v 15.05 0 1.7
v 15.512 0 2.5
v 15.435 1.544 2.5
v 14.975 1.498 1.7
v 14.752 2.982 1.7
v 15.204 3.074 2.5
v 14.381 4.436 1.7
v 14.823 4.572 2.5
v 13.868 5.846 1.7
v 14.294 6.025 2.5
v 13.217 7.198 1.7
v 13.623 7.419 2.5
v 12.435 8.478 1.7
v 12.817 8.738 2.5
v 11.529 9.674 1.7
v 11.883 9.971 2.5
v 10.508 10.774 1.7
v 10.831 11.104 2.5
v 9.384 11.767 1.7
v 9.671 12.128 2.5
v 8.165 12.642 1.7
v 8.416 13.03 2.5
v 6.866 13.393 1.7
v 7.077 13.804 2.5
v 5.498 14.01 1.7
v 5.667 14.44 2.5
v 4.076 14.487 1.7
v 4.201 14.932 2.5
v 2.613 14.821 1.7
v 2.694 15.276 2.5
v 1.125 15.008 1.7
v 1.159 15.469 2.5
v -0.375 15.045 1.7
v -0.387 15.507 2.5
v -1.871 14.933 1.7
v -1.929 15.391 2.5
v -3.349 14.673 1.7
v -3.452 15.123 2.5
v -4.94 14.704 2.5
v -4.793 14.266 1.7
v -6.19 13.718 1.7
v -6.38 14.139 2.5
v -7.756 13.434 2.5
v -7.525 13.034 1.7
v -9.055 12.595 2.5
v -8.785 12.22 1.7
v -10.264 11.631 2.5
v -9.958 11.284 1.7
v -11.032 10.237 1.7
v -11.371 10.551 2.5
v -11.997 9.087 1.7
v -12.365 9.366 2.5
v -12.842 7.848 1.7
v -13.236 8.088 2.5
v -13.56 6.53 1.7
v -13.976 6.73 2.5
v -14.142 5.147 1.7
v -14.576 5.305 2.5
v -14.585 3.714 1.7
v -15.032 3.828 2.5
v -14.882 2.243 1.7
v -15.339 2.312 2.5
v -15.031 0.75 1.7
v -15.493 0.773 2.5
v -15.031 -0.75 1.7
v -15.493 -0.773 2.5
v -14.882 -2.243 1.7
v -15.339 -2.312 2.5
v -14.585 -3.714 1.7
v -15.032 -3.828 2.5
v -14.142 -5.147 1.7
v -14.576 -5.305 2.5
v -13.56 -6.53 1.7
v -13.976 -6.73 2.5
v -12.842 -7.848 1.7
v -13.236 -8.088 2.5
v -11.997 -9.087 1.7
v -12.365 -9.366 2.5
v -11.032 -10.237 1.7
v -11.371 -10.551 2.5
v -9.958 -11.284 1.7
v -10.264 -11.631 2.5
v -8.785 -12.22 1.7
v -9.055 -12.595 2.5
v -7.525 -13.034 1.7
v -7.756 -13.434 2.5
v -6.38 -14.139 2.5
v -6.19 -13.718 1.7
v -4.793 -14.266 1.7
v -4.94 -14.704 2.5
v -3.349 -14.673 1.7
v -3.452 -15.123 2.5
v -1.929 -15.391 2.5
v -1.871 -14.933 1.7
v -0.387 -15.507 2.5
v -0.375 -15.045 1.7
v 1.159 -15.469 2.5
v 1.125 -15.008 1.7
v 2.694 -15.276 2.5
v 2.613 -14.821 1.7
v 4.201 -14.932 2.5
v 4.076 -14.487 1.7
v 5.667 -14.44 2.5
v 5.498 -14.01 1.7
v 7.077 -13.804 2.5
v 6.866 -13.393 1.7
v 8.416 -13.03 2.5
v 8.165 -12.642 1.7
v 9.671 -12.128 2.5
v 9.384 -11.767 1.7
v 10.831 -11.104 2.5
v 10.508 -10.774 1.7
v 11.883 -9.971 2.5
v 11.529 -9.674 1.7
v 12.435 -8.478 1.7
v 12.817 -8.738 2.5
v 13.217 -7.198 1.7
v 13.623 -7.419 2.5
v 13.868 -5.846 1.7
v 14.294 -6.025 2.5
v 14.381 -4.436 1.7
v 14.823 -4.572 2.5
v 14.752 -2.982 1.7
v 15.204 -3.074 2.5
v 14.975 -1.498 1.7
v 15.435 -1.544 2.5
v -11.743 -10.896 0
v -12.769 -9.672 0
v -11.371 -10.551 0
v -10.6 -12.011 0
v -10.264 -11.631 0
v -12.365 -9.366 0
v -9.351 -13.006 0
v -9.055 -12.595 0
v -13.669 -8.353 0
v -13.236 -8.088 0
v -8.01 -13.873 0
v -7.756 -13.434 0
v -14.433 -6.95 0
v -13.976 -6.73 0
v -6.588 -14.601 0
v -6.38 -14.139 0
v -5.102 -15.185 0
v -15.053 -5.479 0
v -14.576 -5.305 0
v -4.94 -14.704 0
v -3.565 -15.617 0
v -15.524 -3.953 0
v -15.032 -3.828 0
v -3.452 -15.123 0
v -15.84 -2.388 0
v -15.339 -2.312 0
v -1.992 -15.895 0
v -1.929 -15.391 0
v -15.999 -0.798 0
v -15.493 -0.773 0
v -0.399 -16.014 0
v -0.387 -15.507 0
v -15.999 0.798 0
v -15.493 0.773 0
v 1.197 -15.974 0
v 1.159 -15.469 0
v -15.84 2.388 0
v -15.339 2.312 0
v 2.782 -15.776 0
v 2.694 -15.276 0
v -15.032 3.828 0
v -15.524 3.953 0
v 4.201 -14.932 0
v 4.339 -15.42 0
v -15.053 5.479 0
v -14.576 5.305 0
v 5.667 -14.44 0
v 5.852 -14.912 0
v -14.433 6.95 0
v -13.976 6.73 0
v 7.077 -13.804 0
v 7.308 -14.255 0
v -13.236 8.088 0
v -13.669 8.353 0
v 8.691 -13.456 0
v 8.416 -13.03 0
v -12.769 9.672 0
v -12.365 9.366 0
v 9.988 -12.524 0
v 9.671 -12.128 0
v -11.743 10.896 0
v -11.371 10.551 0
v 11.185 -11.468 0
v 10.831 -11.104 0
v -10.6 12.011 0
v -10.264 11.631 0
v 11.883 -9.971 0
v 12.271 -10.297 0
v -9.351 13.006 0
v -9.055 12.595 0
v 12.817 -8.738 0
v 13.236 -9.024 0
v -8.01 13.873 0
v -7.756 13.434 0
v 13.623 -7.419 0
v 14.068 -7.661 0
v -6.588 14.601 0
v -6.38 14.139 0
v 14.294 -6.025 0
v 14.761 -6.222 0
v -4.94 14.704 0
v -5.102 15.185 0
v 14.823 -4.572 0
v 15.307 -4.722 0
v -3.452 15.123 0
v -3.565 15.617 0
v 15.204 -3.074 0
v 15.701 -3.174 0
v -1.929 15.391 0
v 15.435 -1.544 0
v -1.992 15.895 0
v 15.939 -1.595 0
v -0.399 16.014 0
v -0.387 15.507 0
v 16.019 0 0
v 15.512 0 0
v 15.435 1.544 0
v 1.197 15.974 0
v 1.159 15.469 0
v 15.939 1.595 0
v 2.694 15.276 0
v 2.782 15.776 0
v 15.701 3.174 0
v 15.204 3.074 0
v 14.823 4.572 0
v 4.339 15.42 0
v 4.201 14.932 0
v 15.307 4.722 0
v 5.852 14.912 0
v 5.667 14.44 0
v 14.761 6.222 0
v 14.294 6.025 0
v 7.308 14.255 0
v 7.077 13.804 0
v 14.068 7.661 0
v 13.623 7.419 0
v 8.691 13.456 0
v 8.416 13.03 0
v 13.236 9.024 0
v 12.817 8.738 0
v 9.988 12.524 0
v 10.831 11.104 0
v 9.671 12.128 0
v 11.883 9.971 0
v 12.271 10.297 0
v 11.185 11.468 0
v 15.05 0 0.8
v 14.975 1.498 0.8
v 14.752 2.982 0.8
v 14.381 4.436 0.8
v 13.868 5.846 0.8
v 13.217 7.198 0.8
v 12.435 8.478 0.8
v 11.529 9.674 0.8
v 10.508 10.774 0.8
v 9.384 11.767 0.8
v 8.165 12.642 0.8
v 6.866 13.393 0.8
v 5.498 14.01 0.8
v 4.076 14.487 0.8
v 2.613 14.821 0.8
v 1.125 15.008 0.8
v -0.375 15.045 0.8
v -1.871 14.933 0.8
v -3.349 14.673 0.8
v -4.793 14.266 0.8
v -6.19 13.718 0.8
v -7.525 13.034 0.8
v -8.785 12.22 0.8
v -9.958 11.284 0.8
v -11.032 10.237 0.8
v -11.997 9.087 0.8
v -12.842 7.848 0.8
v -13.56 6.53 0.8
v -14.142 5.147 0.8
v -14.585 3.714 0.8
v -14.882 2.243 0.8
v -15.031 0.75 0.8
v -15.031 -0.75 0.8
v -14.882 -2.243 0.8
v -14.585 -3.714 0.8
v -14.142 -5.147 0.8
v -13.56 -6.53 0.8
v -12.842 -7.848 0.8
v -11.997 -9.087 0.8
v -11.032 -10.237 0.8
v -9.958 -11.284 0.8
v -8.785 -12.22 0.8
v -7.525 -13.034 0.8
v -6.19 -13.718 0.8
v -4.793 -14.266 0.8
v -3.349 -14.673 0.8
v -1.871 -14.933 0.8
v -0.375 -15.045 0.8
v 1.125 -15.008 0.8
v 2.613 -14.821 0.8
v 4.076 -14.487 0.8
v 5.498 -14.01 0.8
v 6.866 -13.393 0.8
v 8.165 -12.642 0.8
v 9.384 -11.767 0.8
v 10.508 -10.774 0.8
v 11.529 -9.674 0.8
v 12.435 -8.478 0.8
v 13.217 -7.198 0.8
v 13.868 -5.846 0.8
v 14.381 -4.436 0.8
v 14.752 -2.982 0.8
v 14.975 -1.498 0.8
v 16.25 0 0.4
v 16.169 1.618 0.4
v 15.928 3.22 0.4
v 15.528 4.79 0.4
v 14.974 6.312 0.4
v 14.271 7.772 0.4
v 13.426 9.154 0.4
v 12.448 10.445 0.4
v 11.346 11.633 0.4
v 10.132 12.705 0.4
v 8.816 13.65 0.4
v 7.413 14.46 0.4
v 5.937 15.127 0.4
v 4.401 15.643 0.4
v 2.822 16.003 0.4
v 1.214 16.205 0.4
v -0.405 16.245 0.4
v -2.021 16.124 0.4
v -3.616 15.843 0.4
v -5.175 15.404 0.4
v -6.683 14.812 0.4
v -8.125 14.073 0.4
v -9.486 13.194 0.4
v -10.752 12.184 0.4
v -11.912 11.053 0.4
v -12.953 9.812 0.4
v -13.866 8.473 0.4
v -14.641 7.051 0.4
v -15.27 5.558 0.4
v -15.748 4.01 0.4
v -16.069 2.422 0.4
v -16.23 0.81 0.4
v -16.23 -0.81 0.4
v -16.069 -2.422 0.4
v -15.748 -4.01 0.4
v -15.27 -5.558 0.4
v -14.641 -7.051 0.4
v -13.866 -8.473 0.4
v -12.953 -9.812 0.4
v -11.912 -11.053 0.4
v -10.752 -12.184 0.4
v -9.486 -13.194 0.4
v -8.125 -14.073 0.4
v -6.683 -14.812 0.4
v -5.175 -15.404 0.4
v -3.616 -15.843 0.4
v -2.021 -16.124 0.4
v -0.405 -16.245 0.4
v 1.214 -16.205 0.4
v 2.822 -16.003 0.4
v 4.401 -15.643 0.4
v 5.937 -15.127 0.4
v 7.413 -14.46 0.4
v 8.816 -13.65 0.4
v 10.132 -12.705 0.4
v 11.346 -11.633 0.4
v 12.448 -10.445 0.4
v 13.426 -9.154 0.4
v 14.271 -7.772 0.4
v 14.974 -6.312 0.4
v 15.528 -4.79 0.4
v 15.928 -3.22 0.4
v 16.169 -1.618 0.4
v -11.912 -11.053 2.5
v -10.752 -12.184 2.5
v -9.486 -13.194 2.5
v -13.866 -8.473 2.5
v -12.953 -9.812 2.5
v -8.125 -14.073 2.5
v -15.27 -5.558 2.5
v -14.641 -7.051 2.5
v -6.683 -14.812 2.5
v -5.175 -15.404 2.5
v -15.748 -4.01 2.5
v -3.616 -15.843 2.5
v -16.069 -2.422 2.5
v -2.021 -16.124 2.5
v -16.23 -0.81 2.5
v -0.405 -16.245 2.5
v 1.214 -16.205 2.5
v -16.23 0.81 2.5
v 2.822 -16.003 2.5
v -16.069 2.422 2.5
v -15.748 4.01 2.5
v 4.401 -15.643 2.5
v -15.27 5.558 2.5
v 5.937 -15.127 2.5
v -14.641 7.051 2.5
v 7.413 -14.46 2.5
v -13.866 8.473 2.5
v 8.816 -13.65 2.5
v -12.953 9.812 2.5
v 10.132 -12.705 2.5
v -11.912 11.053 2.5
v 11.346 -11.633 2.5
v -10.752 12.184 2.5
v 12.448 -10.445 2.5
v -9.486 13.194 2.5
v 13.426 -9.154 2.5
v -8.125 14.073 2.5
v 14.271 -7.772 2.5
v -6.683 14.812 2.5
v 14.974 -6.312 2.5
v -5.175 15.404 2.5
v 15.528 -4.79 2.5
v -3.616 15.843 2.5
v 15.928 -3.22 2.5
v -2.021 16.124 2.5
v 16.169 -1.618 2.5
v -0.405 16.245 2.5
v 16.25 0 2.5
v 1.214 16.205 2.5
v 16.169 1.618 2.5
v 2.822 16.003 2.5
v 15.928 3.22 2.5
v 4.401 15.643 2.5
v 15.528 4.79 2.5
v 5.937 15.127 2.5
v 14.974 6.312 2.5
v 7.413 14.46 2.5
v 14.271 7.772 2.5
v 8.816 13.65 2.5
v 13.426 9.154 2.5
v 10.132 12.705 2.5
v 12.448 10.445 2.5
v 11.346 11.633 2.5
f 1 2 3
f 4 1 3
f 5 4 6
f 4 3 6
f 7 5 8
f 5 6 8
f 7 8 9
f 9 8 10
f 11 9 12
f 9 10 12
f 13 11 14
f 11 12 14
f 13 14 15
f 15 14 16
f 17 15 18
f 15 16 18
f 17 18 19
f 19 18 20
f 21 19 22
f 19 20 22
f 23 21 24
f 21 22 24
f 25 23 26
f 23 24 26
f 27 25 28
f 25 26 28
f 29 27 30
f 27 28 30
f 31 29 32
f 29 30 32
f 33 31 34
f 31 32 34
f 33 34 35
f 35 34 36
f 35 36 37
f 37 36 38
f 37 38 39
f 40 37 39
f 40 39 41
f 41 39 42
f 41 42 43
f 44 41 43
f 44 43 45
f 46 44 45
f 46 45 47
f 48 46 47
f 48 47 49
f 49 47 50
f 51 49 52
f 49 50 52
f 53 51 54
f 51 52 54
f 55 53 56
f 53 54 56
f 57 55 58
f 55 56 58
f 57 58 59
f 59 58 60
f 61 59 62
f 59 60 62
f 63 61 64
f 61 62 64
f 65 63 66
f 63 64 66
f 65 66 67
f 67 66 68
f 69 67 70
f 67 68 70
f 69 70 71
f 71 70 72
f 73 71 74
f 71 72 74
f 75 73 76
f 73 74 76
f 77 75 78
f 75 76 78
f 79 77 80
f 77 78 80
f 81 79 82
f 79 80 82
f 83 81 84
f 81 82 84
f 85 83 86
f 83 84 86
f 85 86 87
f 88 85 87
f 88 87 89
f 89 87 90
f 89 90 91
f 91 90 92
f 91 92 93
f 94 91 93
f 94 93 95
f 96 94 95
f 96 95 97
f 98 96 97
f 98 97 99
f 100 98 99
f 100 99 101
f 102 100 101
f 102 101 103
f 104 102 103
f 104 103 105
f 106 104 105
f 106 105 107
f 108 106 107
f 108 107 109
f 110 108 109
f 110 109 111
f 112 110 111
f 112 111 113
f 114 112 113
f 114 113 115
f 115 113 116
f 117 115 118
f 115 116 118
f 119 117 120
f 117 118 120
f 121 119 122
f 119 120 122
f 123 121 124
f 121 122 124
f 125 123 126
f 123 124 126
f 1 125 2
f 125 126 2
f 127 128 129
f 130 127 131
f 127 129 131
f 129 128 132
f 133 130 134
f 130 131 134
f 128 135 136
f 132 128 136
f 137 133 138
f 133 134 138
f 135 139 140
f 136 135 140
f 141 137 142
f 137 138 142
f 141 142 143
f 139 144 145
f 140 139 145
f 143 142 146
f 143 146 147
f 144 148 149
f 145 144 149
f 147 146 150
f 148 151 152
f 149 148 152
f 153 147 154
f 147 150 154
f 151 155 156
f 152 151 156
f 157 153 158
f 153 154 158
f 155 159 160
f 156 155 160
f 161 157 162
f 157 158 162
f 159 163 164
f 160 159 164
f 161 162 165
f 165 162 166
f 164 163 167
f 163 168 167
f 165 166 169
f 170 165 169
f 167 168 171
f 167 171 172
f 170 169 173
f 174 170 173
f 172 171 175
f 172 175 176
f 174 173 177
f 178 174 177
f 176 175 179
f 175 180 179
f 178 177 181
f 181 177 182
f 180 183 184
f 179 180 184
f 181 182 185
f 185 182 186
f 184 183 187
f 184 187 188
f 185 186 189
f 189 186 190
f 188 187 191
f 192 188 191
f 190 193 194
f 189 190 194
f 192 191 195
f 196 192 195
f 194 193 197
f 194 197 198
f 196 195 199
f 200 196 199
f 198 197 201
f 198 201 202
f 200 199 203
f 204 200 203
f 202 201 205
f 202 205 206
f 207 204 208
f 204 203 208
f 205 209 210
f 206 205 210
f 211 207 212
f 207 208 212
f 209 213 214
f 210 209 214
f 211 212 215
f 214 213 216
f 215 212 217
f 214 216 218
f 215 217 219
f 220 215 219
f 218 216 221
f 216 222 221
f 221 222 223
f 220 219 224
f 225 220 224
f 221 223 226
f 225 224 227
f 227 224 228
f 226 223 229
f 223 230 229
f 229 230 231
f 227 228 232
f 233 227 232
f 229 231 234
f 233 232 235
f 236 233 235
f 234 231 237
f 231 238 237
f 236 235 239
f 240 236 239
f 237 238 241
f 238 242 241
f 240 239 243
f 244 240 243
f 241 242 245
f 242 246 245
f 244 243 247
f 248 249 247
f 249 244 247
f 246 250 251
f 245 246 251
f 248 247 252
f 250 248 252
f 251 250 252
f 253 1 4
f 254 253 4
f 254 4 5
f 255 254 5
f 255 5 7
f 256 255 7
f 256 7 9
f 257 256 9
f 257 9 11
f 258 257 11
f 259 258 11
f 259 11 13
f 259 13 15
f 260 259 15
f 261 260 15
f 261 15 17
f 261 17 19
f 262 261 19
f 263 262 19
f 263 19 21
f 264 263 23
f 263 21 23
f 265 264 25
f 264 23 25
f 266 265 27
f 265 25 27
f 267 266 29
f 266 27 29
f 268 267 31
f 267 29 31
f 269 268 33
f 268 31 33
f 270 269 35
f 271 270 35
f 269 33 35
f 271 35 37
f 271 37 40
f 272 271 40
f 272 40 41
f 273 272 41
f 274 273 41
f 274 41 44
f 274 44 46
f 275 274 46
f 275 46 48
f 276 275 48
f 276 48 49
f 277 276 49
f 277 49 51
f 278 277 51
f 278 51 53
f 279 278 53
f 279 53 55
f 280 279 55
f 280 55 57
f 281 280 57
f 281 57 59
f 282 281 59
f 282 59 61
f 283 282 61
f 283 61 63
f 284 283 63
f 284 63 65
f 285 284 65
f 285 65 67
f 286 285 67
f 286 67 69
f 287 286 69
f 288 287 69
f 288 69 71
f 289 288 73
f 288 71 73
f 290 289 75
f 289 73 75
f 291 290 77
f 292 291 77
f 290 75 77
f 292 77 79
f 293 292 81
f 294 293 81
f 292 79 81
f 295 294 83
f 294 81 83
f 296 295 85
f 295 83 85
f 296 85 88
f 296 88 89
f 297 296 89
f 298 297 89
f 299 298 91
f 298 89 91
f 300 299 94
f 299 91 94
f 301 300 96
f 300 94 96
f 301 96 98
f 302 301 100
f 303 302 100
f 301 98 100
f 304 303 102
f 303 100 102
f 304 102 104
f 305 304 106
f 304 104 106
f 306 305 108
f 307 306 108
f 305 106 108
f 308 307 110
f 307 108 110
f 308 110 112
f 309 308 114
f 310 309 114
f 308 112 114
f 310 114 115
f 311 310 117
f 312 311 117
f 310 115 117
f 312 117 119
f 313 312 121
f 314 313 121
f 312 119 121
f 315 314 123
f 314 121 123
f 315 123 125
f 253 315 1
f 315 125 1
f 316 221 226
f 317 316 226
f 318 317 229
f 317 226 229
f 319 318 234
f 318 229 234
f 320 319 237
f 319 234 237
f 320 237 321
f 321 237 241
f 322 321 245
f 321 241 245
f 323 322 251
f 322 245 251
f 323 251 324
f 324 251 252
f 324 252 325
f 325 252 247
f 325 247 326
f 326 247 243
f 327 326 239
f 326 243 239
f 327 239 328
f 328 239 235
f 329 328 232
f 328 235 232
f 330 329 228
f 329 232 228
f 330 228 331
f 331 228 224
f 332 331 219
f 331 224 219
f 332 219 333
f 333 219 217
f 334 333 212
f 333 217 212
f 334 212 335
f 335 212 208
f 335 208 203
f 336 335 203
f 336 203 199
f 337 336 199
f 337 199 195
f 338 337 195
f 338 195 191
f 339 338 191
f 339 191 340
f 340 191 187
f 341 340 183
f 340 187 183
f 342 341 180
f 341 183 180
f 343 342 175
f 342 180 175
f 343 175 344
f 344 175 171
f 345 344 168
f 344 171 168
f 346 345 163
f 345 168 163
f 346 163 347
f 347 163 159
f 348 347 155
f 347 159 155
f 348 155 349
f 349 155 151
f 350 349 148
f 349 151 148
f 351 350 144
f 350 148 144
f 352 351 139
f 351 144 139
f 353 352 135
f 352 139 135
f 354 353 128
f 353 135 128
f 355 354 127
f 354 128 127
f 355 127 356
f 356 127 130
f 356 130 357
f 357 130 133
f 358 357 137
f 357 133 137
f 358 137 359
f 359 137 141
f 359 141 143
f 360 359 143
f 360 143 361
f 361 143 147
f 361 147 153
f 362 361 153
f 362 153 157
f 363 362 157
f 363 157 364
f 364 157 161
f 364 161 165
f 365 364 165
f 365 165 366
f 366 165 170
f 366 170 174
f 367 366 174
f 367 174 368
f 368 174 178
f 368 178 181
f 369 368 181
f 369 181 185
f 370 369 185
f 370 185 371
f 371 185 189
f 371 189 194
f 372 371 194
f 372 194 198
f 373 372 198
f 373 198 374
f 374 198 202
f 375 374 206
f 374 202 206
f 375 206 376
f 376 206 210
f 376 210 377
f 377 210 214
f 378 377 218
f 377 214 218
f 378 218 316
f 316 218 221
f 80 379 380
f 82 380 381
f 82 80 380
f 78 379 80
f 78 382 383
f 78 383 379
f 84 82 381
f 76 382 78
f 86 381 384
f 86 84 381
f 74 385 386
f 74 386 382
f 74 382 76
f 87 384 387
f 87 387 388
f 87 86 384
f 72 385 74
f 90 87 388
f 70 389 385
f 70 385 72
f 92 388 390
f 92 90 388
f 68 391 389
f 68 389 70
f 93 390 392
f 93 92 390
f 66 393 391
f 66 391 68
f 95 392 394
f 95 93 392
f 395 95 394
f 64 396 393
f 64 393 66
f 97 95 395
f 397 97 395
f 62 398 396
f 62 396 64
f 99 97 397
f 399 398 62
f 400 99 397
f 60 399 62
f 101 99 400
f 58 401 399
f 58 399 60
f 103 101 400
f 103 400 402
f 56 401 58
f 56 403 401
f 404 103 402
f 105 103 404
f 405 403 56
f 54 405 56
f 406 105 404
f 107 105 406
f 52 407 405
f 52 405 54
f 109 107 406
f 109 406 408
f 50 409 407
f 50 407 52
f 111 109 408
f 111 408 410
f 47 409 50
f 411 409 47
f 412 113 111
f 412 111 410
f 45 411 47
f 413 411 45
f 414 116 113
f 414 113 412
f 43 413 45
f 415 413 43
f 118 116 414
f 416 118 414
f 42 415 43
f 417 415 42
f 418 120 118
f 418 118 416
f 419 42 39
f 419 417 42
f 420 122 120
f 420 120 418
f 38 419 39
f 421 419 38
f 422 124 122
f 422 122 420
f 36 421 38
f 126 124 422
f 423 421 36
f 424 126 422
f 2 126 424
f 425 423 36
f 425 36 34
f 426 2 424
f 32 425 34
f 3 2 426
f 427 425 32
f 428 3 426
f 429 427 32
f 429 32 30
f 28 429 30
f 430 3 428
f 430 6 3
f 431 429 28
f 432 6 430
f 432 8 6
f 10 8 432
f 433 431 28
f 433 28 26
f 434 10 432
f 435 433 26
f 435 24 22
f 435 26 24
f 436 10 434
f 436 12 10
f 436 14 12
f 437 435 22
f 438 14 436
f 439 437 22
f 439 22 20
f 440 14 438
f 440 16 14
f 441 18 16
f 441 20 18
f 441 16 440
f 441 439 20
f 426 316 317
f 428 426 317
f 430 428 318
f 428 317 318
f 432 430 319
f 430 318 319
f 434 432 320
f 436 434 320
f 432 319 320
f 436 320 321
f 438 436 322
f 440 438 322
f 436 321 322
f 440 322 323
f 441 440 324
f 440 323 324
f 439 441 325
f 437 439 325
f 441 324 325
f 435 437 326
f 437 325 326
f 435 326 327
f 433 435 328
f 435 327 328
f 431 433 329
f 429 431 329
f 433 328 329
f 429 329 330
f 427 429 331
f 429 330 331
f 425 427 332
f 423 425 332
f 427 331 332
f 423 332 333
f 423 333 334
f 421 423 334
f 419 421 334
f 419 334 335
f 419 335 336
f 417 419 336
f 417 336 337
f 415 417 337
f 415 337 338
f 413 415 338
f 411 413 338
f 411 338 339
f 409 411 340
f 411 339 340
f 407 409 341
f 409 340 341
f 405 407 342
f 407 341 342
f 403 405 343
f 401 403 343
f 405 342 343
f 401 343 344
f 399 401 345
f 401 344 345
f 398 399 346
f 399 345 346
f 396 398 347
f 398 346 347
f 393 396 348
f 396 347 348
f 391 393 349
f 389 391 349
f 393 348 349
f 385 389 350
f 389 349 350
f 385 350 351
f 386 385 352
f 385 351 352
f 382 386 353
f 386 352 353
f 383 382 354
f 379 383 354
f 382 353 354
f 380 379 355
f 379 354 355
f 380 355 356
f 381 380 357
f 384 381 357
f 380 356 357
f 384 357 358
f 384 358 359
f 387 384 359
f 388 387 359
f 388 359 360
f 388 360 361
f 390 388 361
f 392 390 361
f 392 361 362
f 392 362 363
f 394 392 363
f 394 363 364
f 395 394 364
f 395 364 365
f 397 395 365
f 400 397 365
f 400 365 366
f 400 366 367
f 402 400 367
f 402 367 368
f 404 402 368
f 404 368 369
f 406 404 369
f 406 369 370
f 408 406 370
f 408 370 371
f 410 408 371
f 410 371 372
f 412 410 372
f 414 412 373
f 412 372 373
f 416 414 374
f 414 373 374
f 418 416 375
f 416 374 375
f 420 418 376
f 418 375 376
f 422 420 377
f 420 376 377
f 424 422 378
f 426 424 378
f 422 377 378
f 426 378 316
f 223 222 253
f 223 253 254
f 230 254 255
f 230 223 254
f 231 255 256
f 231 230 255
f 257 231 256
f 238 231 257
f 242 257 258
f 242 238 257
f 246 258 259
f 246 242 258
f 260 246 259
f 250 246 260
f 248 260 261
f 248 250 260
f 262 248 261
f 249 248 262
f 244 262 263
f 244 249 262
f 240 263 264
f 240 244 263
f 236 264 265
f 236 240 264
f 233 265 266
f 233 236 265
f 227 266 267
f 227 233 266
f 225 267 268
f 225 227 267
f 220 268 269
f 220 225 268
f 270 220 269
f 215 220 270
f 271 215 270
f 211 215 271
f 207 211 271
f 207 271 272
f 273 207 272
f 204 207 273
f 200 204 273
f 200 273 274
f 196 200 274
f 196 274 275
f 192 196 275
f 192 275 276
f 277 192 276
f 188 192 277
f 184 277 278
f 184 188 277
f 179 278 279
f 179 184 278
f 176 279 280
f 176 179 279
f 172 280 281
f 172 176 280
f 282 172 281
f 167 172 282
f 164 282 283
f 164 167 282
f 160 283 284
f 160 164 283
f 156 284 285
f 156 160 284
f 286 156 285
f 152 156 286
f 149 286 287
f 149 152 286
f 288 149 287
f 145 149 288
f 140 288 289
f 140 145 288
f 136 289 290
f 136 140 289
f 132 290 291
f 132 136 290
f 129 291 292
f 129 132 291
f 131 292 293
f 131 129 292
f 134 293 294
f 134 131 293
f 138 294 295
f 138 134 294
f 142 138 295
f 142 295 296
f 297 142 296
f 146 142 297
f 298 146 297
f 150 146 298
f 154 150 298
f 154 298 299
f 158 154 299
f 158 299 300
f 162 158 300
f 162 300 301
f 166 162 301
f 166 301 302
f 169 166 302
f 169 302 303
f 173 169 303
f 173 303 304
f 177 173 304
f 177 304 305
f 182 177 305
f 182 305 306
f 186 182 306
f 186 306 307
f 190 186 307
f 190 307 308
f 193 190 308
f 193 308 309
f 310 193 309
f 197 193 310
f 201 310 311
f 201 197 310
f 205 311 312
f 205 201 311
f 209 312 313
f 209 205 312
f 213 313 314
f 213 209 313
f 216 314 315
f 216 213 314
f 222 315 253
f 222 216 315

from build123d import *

# Parameters (mm, degrees)
F0_R     = 16.25
F1_DEPTH = 2.5
F2_R     = 15.05
F3_DEPTH = 2.501
F4_SIZE2 = 0.4618802154
F4_SIZE  = 0.8
F5_SIZE2 = 0.2309401077
F5_SIZE  = 0.4


with BuildPart() as f1:
    # F0 (on Top) → F1 (new body)
    with BuildSketch(Plane.XY):
        Circle(F0_R)
    extrude(amount=F1_DEPTH)

    # F2 (on face) → F3 (cut, through all)
    with BuildSketch(Plane.XY.offset(2.5)):
        Circle(F2_R)
    extrude(amount=-F3_DEPTH, mode=Mode.SUBTRACT)

    # F4
    f4_edges = [f1.edges().sort_by_distance(p)[0] for p in [
        (-15.05, 0, 2.5),
        (-15.05, 0, 0),
    ]]
    f4_side = f1.faces().sort_by_distance((-15.05, 0, 1.25))[0]
    chamfer(f4_edges, length=F4_SIZE, length2=F4_SIZE2, reference=f4_side)

    # F5
    f5_edges = [f1.edges().sort_by_distance(p)[0] for p in [
        (-16.25, 0, 0),
    ]]
    f5_side = f1.faces().sort_by_distance((-16.25, 0, 1.25))[0]
    chamfer(f5_edges, length=F5_SIZE, length2=F5_SIZE2, reference=f5_side)


solid = f1.part
